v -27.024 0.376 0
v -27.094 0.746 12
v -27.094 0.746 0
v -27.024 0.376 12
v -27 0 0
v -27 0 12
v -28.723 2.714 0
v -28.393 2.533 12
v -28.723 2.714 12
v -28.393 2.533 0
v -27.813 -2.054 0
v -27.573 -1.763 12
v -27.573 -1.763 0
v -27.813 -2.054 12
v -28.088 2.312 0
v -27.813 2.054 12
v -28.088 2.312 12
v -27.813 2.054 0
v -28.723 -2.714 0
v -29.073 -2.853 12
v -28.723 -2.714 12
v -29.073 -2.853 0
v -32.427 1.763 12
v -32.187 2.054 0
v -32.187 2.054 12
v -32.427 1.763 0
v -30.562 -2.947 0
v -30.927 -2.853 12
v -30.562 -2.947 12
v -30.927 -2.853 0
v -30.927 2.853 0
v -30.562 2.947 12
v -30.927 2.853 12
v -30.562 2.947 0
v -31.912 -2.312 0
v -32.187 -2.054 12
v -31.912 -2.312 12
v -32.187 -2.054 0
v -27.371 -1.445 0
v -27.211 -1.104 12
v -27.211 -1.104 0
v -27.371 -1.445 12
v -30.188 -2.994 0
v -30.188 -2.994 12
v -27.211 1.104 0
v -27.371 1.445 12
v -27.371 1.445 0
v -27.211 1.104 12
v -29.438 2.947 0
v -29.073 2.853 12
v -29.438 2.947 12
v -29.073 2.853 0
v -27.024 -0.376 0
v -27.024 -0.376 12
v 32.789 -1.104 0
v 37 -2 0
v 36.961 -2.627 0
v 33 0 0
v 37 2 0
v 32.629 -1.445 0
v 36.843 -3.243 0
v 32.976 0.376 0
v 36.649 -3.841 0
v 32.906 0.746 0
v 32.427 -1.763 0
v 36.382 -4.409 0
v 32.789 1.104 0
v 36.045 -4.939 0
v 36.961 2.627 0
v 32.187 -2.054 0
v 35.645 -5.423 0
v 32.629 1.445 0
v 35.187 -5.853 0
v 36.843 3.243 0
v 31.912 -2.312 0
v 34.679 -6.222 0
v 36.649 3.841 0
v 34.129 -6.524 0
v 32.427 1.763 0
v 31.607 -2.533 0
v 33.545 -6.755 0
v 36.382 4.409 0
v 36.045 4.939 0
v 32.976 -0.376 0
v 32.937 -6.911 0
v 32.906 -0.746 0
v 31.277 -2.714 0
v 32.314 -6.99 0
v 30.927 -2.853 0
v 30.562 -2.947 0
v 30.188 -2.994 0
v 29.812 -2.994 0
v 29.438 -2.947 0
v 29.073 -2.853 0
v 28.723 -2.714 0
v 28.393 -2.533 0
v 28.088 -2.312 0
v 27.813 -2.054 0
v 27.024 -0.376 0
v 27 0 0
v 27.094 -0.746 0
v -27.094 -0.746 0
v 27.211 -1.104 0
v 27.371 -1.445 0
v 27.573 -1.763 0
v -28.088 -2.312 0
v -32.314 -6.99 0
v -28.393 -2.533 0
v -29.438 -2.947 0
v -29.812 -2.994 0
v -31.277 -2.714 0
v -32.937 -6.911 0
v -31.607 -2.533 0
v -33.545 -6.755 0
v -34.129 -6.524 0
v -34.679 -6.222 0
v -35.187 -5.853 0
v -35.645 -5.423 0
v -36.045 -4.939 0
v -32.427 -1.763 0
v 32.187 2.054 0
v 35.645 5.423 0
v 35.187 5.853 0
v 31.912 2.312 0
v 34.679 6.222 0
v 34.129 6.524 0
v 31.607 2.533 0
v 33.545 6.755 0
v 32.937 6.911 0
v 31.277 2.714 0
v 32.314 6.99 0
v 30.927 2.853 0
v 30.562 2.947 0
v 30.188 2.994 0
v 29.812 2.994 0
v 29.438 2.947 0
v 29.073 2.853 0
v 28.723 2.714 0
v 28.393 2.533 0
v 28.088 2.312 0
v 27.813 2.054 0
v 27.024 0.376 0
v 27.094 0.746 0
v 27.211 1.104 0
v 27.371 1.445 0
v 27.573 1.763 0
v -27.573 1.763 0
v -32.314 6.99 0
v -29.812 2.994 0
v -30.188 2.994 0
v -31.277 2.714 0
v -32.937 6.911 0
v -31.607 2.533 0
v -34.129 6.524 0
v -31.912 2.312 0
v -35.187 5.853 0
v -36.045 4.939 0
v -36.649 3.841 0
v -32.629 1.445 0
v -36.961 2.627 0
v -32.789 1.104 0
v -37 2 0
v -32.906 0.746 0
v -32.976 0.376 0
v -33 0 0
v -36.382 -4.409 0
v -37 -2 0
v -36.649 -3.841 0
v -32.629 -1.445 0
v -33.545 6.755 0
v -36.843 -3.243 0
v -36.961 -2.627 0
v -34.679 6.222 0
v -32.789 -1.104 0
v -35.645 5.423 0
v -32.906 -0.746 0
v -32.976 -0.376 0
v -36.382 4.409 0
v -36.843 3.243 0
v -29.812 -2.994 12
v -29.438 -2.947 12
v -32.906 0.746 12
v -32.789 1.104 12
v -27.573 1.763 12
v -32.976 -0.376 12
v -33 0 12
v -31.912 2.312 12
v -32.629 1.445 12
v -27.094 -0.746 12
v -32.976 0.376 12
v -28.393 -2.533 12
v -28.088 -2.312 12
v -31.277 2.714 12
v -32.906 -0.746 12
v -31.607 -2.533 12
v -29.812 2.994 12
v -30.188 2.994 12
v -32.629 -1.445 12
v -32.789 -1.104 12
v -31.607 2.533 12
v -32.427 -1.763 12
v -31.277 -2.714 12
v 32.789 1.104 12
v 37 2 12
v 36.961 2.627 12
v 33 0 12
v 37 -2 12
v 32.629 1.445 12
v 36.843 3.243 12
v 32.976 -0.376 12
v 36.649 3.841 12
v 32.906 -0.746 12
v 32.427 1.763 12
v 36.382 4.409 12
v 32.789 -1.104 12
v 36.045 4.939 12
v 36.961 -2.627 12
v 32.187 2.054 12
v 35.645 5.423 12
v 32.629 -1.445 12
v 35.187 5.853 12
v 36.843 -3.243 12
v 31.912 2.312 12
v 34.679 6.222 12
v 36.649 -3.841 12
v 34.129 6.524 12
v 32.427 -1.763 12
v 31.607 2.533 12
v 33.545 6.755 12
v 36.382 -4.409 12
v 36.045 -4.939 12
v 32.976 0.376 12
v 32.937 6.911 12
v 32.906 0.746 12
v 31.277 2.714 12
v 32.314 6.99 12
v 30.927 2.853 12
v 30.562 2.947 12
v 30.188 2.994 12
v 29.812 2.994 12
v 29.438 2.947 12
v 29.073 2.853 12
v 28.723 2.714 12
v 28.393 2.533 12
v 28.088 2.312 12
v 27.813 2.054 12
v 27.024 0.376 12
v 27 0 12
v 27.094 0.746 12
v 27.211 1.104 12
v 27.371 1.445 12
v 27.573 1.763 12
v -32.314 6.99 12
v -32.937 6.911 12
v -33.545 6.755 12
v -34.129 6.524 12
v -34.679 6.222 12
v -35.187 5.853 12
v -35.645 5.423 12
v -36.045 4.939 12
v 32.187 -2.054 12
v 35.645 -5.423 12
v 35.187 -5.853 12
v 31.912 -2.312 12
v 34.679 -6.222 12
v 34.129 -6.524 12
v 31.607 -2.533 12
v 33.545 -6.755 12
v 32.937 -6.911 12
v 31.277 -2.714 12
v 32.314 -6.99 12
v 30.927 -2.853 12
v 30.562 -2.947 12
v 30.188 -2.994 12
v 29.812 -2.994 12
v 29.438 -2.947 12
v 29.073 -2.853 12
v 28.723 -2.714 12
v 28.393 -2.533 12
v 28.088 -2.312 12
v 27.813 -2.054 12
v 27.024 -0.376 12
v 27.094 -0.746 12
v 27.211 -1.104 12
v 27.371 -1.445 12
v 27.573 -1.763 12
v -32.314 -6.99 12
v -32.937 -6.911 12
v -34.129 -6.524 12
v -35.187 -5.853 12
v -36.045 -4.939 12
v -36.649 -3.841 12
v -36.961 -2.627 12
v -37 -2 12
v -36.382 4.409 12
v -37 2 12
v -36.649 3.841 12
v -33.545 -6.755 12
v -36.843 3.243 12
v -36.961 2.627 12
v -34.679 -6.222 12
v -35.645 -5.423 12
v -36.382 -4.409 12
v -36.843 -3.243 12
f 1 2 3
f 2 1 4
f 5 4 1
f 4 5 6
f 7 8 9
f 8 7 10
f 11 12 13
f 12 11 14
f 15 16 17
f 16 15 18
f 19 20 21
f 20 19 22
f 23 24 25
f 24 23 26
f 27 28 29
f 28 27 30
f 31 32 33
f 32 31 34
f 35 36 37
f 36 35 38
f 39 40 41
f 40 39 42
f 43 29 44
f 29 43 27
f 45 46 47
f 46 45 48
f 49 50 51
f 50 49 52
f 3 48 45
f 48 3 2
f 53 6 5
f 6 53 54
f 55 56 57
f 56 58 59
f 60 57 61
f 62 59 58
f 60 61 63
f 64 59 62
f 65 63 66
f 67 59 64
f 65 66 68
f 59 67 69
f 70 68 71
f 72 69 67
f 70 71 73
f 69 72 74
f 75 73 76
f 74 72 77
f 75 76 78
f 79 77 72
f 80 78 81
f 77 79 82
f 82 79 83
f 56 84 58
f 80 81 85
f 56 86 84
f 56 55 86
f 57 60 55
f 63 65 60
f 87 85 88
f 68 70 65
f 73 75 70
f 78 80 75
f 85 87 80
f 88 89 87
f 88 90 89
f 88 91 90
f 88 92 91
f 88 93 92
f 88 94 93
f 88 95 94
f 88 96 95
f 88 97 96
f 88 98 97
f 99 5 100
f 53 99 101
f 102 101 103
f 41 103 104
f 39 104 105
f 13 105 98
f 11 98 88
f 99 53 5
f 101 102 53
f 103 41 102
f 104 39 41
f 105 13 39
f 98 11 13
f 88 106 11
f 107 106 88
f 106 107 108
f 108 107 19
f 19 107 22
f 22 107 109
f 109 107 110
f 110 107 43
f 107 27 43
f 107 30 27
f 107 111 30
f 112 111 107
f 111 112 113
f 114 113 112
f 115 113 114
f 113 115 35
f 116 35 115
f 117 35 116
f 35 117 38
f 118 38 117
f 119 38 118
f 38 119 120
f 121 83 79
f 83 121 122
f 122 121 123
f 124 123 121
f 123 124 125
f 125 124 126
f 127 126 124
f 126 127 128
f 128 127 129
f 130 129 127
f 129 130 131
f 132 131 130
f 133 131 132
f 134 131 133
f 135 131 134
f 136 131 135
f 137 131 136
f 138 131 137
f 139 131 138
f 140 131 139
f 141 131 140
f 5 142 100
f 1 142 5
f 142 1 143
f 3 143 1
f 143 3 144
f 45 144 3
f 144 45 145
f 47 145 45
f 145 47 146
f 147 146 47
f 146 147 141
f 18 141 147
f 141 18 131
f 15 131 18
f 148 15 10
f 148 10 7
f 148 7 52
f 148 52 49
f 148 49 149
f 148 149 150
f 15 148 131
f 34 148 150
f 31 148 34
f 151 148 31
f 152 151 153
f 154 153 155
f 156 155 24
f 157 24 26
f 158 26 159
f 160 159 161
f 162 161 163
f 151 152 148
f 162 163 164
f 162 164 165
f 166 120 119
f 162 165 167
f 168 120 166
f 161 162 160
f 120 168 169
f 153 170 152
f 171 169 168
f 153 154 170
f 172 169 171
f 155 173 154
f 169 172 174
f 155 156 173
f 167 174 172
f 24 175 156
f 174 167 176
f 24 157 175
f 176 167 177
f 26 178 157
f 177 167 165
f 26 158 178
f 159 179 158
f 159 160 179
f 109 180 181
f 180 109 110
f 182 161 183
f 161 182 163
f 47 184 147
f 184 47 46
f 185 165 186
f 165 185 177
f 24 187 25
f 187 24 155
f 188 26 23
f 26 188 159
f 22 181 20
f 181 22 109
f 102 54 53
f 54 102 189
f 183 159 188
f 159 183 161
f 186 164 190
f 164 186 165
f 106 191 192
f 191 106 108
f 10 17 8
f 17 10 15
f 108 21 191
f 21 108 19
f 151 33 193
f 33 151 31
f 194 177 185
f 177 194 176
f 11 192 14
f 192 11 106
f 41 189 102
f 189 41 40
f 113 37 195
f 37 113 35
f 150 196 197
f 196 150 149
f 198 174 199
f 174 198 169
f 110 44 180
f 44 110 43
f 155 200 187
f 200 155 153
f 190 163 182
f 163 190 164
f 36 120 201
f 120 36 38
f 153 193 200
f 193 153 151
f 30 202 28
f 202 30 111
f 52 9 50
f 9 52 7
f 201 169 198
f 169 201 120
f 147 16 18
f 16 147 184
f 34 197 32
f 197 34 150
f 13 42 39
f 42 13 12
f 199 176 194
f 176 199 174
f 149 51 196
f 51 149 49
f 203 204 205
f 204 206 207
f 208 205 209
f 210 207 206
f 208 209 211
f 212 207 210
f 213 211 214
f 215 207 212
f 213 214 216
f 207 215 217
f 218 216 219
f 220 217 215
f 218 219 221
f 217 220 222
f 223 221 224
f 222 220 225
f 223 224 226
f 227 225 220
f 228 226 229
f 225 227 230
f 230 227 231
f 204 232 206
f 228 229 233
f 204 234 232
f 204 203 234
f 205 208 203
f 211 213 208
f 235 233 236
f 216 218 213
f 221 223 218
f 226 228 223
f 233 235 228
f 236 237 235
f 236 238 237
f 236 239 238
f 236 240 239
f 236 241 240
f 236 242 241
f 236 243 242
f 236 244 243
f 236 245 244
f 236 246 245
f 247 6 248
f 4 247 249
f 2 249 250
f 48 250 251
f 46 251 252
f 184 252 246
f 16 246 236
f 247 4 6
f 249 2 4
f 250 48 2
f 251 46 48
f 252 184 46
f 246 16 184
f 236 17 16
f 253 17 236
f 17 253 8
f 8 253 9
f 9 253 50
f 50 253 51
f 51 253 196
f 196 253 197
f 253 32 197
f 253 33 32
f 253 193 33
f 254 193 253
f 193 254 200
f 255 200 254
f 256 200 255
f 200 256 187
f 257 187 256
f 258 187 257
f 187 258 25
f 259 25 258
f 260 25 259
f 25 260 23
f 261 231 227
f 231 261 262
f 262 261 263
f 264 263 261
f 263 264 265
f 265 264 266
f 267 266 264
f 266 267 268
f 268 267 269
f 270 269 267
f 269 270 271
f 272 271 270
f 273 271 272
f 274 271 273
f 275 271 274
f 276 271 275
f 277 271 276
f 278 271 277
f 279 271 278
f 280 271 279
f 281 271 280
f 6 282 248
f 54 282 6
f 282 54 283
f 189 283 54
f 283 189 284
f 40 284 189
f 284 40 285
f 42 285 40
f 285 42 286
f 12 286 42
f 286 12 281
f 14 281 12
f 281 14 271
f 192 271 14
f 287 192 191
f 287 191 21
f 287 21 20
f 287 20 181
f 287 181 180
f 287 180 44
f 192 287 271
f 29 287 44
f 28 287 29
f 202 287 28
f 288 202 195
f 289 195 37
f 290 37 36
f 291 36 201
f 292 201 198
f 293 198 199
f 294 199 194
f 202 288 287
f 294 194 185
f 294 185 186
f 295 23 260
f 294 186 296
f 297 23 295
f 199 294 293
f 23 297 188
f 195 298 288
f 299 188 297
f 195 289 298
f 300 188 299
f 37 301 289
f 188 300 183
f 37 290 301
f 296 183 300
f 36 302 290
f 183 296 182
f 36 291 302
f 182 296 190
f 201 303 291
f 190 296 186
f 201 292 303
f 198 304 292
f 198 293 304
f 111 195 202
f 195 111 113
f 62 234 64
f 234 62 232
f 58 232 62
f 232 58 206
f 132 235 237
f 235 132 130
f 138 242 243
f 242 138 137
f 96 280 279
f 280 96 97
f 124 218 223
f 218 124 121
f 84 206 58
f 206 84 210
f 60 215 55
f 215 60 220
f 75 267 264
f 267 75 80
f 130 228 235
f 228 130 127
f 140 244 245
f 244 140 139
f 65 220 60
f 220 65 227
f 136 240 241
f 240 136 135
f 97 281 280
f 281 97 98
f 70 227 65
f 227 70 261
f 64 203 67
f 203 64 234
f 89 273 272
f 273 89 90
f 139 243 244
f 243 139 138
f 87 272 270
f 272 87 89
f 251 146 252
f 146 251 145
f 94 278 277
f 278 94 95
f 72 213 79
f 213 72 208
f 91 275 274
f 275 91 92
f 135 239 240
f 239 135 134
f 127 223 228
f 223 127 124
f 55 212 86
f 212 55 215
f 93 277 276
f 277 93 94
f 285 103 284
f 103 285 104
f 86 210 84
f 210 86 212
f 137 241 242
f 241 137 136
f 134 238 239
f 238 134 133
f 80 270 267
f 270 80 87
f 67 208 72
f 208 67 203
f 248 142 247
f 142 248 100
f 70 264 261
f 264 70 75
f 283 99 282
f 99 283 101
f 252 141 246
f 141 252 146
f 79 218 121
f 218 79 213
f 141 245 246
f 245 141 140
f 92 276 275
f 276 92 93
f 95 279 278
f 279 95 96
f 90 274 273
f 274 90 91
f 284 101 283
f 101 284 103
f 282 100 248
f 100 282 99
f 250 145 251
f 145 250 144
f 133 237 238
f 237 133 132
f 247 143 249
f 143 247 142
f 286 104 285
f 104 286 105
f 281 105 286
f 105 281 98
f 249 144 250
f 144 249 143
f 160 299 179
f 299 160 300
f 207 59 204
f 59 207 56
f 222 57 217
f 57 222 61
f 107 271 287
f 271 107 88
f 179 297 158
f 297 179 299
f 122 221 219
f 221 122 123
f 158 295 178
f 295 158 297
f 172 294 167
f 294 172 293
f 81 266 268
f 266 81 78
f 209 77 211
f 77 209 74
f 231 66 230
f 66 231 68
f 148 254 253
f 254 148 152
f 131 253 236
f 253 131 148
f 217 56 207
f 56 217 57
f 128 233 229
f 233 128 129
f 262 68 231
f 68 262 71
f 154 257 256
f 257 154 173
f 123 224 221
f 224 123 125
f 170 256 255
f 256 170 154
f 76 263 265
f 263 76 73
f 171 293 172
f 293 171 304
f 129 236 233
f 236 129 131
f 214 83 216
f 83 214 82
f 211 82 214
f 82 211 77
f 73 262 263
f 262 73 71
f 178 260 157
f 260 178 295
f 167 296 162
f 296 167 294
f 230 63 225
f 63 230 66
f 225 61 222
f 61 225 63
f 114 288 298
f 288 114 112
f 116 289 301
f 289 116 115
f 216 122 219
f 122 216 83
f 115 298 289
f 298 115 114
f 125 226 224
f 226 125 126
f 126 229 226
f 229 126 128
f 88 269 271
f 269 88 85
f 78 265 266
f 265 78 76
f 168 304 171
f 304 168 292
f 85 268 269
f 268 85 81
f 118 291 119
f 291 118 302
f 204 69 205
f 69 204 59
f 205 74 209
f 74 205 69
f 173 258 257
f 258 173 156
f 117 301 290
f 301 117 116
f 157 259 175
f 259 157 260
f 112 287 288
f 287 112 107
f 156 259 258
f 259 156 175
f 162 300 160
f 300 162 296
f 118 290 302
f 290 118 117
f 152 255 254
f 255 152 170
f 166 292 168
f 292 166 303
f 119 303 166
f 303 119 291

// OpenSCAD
$fn = 50;


difference() {
	union() {
		hull() {
			translate(v = [-32.0000000000, 2.0000000000, 0]) {
				cylinder(h = 12, r = 5);
			}
			translate(v = [32.0000000000, 2.0000000000, 0]) {
				cylinder(h = 12, r = 5);
			}
			translate(v = [-32.0000000000, -2.0000000000, 0]) {
				cylinder(h = 12, r = 5);
			}
			translate(v = [32.0000000000, -2.0000000000, 0]) {
				cylinder(h = 12, r = 5);
			}
		}
	}
	union() {
		translate(v = [-30.0000000000, 0.0000000000, 0]) {
			cylinder(h = 12, r = 3.0000000000);
		}
		translate(v = [30.0000000000, 0.0000000000, 0]) {
			cylinder(h = 12, r = 3.0000000000);
		}
		translate(v = [-30.0000000000, 0.0000000000, 0]) {
			cylinder(h = 12, r = 1.5000000000);
		}
		translate(v = [30.0000000000, 0.0000000000, 0]) {
			cylinder(h = 12, r = 1.5000000000);
		}
		translate(v = [-30.0000000000, 0.0000000000, 0]) {
			cylinder(h = 12, r = 1.5000000000);
		}
		translate(v = [30.0000000000, 0.0000000000, 0]) {
			cylinder(h = 12, r = 1.5000000000);
		}
		translate(v = [-30.0000000000, 0.0000000000, 0]) {
			cylinder(h = 12, r = 1.5000000000);
		}
		translate(v = [30.0000000000, 0.0000000000, 0]) {
			cylinder(h = 12, r = 1.5000000000);
		}
	}
}
